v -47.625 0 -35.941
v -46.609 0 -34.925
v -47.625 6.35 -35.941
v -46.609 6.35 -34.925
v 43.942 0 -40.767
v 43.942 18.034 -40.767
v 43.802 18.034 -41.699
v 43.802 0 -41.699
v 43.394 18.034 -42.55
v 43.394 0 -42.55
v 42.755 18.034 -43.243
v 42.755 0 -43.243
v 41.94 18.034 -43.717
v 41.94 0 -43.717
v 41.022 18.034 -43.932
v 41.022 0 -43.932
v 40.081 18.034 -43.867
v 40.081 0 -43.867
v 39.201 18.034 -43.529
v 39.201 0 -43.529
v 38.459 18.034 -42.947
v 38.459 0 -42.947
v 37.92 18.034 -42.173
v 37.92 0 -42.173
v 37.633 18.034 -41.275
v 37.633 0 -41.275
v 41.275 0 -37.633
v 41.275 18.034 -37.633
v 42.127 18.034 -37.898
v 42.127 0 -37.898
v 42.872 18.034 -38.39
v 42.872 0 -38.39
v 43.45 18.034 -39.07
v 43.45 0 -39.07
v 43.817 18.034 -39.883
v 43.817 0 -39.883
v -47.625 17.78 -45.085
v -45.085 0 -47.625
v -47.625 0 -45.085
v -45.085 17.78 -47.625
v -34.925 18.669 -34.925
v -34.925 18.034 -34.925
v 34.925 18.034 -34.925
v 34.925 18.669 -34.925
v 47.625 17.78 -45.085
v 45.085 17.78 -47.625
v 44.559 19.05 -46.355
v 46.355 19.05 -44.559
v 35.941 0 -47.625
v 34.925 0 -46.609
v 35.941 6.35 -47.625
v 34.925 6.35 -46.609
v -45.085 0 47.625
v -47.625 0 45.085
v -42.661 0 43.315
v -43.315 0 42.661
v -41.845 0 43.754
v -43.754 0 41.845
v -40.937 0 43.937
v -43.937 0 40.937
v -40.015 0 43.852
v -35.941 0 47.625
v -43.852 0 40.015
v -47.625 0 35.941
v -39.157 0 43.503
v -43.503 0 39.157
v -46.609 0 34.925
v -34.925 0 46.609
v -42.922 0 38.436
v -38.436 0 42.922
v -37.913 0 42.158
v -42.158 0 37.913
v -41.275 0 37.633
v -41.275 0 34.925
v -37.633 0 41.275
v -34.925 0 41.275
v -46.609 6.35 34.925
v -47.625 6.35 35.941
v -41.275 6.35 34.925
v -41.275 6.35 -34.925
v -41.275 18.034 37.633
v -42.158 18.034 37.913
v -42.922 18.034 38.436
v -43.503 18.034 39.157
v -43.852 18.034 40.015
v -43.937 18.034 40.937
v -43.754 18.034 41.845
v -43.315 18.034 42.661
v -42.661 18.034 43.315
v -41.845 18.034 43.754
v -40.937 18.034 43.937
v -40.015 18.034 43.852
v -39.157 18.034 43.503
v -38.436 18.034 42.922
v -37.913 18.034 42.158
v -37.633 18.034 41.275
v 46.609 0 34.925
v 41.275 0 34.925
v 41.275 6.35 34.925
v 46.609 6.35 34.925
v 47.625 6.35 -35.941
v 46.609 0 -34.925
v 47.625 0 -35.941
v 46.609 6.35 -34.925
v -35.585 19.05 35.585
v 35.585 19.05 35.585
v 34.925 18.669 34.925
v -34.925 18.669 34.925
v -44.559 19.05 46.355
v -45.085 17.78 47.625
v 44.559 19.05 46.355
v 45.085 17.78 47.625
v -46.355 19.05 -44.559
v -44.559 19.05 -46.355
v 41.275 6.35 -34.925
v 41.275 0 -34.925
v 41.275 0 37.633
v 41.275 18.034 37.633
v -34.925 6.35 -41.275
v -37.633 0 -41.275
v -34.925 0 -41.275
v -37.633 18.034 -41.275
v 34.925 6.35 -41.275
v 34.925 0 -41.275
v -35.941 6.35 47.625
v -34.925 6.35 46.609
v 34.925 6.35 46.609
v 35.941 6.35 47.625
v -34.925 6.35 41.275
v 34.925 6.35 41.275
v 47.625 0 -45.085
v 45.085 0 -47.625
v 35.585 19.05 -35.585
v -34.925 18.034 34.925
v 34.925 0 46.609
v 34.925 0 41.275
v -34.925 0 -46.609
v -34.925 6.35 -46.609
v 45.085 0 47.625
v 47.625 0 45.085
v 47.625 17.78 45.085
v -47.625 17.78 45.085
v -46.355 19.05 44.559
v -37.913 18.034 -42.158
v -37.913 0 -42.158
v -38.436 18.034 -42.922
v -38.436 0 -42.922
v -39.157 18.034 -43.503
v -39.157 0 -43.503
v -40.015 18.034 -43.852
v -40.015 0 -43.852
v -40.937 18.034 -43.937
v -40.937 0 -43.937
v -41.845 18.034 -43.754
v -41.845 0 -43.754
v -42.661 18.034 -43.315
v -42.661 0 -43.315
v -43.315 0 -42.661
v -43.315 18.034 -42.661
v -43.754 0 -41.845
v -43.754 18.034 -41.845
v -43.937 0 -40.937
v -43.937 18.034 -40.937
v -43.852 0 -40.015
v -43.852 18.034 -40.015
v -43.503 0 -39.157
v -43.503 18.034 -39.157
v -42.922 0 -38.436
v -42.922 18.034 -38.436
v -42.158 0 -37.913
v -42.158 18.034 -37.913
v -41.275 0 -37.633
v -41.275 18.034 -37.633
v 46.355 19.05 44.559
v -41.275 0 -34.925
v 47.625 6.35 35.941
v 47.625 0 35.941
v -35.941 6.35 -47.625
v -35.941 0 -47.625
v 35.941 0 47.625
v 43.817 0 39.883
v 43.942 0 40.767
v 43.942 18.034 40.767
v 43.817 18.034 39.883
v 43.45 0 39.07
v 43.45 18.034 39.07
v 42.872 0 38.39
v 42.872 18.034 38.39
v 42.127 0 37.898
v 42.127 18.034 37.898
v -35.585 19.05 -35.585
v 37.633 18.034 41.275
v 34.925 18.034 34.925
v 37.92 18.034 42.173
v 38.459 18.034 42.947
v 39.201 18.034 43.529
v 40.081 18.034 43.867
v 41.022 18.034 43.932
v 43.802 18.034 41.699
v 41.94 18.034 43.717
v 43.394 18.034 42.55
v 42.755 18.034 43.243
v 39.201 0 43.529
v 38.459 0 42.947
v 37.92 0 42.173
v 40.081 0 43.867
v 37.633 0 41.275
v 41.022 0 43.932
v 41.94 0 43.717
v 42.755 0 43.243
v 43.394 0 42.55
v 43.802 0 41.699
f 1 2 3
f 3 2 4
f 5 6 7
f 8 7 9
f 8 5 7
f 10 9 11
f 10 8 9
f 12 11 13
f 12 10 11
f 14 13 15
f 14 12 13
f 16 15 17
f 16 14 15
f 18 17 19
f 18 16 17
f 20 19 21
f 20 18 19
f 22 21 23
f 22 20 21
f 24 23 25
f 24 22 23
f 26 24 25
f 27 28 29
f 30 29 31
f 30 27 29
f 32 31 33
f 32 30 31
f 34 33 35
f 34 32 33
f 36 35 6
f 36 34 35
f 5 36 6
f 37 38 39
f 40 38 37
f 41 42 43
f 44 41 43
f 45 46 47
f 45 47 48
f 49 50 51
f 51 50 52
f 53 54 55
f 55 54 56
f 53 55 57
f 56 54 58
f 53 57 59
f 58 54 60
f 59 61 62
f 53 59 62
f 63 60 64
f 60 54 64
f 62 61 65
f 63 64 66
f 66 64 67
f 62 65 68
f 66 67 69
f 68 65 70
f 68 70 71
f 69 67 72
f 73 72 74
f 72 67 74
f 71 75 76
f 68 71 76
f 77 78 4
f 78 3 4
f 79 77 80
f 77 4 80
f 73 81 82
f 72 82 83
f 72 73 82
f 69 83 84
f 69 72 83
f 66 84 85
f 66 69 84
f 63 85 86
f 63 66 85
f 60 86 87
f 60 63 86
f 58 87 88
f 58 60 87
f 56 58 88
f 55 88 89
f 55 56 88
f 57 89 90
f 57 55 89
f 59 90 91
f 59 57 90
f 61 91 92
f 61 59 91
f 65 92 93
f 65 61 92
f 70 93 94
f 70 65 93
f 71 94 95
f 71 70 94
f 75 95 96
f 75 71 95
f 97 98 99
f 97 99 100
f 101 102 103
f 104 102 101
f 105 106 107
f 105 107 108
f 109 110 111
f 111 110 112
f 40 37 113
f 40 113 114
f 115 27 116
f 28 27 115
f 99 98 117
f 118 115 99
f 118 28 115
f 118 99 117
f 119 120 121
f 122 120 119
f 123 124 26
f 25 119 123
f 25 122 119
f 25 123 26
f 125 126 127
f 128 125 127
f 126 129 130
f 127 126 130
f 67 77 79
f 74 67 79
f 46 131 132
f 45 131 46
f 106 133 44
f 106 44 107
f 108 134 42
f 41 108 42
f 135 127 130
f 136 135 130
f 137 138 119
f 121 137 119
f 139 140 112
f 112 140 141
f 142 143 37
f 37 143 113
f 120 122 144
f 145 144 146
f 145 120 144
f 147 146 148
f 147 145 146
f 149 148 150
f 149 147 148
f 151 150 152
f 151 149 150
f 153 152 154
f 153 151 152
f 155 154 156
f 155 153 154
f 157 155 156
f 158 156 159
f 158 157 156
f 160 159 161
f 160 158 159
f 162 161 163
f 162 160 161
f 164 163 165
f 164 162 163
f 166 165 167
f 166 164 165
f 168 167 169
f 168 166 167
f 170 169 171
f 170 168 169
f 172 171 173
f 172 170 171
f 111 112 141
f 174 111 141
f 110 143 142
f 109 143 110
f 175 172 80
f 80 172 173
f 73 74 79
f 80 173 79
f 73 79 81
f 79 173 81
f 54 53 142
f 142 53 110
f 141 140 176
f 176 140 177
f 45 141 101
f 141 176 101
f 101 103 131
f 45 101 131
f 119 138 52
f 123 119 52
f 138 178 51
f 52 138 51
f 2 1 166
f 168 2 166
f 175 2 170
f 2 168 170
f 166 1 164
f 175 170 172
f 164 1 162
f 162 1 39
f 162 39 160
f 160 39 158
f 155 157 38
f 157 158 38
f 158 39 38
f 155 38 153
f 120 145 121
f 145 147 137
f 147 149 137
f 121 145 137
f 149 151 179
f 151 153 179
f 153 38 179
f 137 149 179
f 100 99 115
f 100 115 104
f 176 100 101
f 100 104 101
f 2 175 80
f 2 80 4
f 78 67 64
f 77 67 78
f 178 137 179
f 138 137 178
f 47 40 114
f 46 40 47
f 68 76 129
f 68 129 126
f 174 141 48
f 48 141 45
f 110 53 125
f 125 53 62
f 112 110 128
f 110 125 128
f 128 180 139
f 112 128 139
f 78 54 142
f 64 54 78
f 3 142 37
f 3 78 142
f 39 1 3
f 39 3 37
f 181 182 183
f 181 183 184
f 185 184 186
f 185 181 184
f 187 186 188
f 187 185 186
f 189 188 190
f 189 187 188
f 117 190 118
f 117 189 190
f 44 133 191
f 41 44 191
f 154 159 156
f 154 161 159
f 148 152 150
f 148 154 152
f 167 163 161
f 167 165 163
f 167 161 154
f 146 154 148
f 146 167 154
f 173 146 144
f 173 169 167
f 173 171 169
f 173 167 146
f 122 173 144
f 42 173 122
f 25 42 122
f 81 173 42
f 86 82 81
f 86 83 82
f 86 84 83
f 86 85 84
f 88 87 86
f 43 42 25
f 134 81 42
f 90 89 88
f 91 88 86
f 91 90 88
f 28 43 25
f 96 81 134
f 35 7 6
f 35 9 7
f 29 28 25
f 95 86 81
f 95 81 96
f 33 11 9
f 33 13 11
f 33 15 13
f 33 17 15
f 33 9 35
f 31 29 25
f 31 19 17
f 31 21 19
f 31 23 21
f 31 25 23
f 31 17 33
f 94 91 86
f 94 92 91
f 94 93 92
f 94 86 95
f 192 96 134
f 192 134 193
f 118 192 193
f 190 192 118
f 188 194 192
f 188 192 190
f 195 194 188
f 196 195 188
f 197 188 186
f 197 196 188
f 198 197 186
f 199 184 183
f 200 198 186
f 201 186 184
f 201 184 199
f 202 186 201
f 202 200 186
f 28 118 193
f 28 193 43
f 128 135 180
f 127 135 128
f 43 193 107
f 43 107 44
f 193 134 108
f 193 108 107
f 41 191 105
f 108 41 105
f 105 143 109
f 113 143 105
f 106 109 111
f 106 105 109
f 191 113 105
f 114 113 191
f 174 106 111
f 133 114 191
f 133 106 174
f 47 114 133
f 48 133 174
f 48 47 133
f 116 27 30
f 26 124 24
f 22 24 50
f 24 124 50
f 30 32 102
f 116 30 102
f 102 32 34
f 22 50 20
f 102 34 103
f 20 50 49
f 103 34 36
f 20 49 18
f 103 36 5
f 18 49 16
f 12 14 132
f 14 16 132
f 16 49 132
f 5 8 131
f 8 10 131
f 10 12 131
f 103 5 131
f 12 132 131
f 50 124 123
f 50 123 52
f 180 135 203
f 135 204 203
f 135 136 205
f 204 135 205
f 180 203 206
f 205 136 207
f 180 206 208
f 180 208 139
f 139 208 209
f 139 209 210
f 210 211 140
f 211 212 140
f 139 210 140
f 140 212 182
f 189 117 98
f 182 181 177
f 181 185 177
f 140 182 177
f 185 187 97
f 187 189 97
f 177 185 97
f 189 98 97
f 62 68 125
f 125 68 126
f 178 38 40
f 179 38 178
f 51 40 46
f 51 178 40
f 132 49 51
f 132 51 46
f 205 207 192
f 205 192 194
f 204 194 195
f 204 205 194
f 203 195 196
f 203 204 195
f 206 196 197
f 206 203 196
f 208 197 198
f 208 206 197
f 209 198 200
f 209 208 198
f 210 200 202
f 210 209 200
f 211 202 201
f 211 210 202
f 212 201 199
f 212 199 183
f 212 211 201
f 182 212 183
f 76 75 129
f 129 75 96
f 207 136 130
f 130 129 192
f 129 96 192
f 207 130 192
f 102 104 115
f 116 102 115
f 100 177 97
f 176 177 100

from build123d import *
from OCP.BRepFilletAPI import BRepFilletAPI_MakeChamfer

# Parameters (mm, degrees)
SKETCH1_W               = 95.25
SKETCH1_H               = 95.25
BOSS_EXTRUDE1_DEPTH     = 19.05
CUT_EXTRUDE1_DEPTH      = 6.35
LEGS_OUTER_SIZE         = 2.54
TOP_FACE_SIZE           = 1.27
LEGS_INNER_SIZE         = 1.016
CUT_EXTRUDE5_DEPTH      = 69.538830235
CUT_EXTRUDE5_DEPTH_BACK = 11.684
SKETCH6_W               = 82.55
SKETCH6_H               = 82.55
SKETCH3_3_W             = 69.85
SKETCH3_3_H             = 69.85
CUT_EXTRUDE6_DEPTH      = 70.9941694
CHAMFER3_SIZE           = 0.381
CHAMFER3_SIZE2          = 0.659911358
CUT_EXTRUDE3_DEPTH      = 18.034


with BuildPart() as part:
    # Sketch1 → Boss-Extrude1 (new body)
    with BuildSketch(Plane(origin=(0, 0, 0), x_dir=(1, 0, 0), z_dir=(0, 1, 0))):
        Rectangle(SKETCH1_W, SKETCH1_H)
    extrude(amount=BOSS_EXTRUDE1_DEPTH)

    # Sketch1<3> → Cut-Extrude1 (cut)
    with BuildSketch(Plane(origin=(0, 0, 0), x_dir=(1, 0, 0), z_dir=(0, 1, 0))):
        Polygon((-47.625, -34.925), (-34.925, -34.925), (-34.925, -47.625), (34.925, -47.625), (34.925, -34.925), (47.625, -34.925), (47.625, 34.925), (34.925, 34.925), (34.925, 47.625), (-34.925, 47.625), (-34.925, 34.925), (-47.625, 34.925), align=None)
    extrude(amount=CUT_EXTRUDE1_DEPTH, mode=Mode.SUBTRACT)

    # legs, outer
    legs_outer_edges = [part.edges().sort_by_distance(p)[0] for p in [
        (-47.625, 9.525, 47.625),
        (47.625, 9.525, 47.625),
        (47.625, 9.525, -47.625),
        (-47.625, 9.525, -47.625),
    ]]
    chamfer(legs_outer_edges, length=LEGS_OUTER_SIZE)

    # top face
    top_face_edges = [part.edges().sort_by_distance(p)[0] for p in [
        (0, 19.05, -47.625),
        (47.625, 19.05, 0),
        (-47.625, 19.05, 0),
        (0, 19.05, 47.625),
        (-46.355, 19.05, -46.355),
        (-46.355, 19.05, 46.355),
        (46.355, 19.05, 46.355),
        (46.355, 19.05, -46.355),
    ]]
    chamfer(top_face_edges, length=TOP_FACE_SIZE)

    # legs, inner
    legs_inner_edges = [part.edges().sort_by_distance(p)[0] for p in [
        (-47.625, 3.175, 34.925),
        (-47.625, 3.175, -34.925),
        (-34.925, 3.175, -47.625),
        (34.925, 3.175, -47.625),
        (47.625, 3.175, -34.925),
        (47.625, 3.175, 34.925),
        (34.925, 3.175, 47.625),
        (-34.925, 3.175, 47.625),
    ]]
    chamfer(legs_inner_edges, length=LEGS_INNER_SIZE)

    # Sketch6 → Cut-Extrude5 (cut, two sides: drawn at the far end of the back side and taken through both)
    with BuildSketch(Plane.XZ.offset(-6.35).offset(-CUT_EXTRUDE5_DEPTH_BACK)):
        Rectangle(SKETCH6_W, SKETCH6_H)
    extrude(amount=CUT_EXTRUDE5_DEPTH + CUT_EXTRUDE5_DEPTH_BACK, mode=Mode.SUBTRACT)

    # Sketch3<3> → Cut-Extrude6 (cut, through all)
    with BuildSketch(Plane(origin=(0, 0, 0), x_dir=(1, 0, 0), z_dir=(0, 1, 0))):
        Rectangle(SKETCH3_3_W, SKETCH3_3_H)
    extrude(amount=CUT_EXTRUDE6_DEPTH, mode=Mode.SUBTRACT)

    # Chamfer3: one chamfer whose edges measure the first distance from different faces: ONE call of the kernel's chamfer builder (chamfer() names one face for all edges)
    chamfer3_edges_1 = [part.edges().sort_by_distance(p)[0] for p in [
        (34.925, 19.05, 0),
    ]]
    chamfer3_side_1 = [part.faces().sort_by_distance(p)[0] for p in [
        (34.925, 18.542, 0),
    ]]
    chamfer3_edges_2 = [part.edges().sort_by_distance(p)[0] for p in [
        (0, 19.05, -34.925),
    ]]
    chamfer3_side_2 = [part.faces().sort_by_distance(p)[0] for p in [
        (0, 18.542, -34.925),
    ]]
    chamfer3_edges_3 = [part.edges().sort_by_distance(p)[0] for p in [
        (-34.925, 19.05, 0),
    ]]
    chamfer3_side_3 = [part.faces().sort_by_distance(p)[0] for p in [
        (-34.925, 18.542, 0),
    ]]
    chamfer3_edges_4 = [part.edges().sort_by_distance(p)[0] for p in [
        (0, 19.05, 34.925),
    ]]
    chamfer3_side_4 = [part.faces().sort_by_distance(p)[0] for p in [
        (0, 18.542, 34.925),
    ]]
    chamfer3 = BRepFilletAPI_MakeChamfer(part.part.solid().wrapped)
    for e in chamfer3_edges_1:
        chamfer3.Add(CHAMFER3_SIZE, CHAMFER3_SIZE2, e.wrapped, chamfer3_side_1[0].wrapped)  # the first distance lies on this face
    for e in chamfer3_edges_2:
        chamfer3.Add(CHAMFER3_SIZE, CHAMFER3_SIZE2, e.wrapped, chamfer3_side_2[0].wrapped)  # the first distance lies on this face
    for e in chamfer3_edges_3:
        chamfer3.Add(CHAMFER3_SIZE, CHAMFER3_SIZE2, e.wrapped, chamfer3_side_3[0].wrapped)  # the first distance lies on this face
    for e in chamfer3_edges_4:
        chamfer3.Add(CHAMFER3_SIZE, CHAMFER3_SIZE2, e.wrapped, chamfer3_side_4[0].wrapped)  # the first distance lies on this face
    add(Compound.cast(chamfer3.Shape()), mode=Mode.REPLACE)

    # Sketch3 → Cut-Extrude3 (cut)
    with BuildSketch(Plane(origin=(0, 0, 0), x_dir=(1, 0, 0), z_dir=(0, 1, 0))):
        with BuildLine():
            ThreePointArc((37.592, 40.767), (38.52193597, 38.52193597), (40.767, 37.592))
            Line((40.767, 37.592), (40.767, 40.767))
            Line((40.767, 40.767), (37.592, 40.767))
        make_face()
        with BuildLine():
            Line((40.767, 40.767), (40.767, 37.592))
            ThreePointArc((40.767, 37.592), (43.01206403, 38.52193597), (43.942, 40.767))
            ThreePointArc((43.942, 40.767), (40.767, 43.942), (37.592, 40.767))
            Line((37.592, 40.767), (40.767, 40.767))
        make_face()
        with BuildLine():
            ThreePointArc((-37.592, 40.767), (-43.01206403, 43.01206403), (-40.767, 37.592))
            Line((-40.767, 37.592), (-40.767, 40.767))
            Line((-40.767, 40.767), (-37.592, 40.767))
        make_face()
        with BuildLine():
            Line((-40.767, 40.767), (-40.767, 37.592))
            ThreePointArc((-40.767, 37.592), (-38.52193597, 38.52193597), (-37.592, 40.767))
            Line((-37.592, 40.767), (-40.767, 40.767))
        make_face()
        with BuildLine():
            ThreePointArc((40.767, -37.592), (38.52193597, -38.52193597), (37.592, -40.767))
            Line((37.592, -40.767), (40.767, -40.767))
            Line((40.767, -40.767), (40.767, -37.592))
        make_face()
        with BuildLine():
            Line((40.767, -40.767), (37.592, -40.767))
            ThreePointArc((37.592, -40.767), (40.767, -43.942), (43.942, -40.767))
            ThreePointArc((43.942, -40.767), (43.01206403, -38.52193597), (40.767, -37.592))
            Line((40.767, -37.592), (40.767, -40.767))
        make_face()
        with BuildLine():
            Line((-40.767, -37.592), (-40.767, -40.767))
            Line((-40.767, -40.767), (-37.592, -40.767))
            ThreePointArc((-37.592, -40.767), (-38.52193597, -38.52193597), (-40.767, -37.592))
        make_face()
        with BuildLine():
            Line((-37.592, -40.767), (-40.767, -40.767))
            Line((-40.767, -40.767), (-40.767, -37.592))
            ThreePointArc((-40.767, -37.592), (-43.01206403, -43.01206403), (-37.592, -40.767))
        make_face()
    extrude(amount=CUT_EXTRUDE3_DEPTH, mode=Mode.SUBTRACT)


solid = part.part
